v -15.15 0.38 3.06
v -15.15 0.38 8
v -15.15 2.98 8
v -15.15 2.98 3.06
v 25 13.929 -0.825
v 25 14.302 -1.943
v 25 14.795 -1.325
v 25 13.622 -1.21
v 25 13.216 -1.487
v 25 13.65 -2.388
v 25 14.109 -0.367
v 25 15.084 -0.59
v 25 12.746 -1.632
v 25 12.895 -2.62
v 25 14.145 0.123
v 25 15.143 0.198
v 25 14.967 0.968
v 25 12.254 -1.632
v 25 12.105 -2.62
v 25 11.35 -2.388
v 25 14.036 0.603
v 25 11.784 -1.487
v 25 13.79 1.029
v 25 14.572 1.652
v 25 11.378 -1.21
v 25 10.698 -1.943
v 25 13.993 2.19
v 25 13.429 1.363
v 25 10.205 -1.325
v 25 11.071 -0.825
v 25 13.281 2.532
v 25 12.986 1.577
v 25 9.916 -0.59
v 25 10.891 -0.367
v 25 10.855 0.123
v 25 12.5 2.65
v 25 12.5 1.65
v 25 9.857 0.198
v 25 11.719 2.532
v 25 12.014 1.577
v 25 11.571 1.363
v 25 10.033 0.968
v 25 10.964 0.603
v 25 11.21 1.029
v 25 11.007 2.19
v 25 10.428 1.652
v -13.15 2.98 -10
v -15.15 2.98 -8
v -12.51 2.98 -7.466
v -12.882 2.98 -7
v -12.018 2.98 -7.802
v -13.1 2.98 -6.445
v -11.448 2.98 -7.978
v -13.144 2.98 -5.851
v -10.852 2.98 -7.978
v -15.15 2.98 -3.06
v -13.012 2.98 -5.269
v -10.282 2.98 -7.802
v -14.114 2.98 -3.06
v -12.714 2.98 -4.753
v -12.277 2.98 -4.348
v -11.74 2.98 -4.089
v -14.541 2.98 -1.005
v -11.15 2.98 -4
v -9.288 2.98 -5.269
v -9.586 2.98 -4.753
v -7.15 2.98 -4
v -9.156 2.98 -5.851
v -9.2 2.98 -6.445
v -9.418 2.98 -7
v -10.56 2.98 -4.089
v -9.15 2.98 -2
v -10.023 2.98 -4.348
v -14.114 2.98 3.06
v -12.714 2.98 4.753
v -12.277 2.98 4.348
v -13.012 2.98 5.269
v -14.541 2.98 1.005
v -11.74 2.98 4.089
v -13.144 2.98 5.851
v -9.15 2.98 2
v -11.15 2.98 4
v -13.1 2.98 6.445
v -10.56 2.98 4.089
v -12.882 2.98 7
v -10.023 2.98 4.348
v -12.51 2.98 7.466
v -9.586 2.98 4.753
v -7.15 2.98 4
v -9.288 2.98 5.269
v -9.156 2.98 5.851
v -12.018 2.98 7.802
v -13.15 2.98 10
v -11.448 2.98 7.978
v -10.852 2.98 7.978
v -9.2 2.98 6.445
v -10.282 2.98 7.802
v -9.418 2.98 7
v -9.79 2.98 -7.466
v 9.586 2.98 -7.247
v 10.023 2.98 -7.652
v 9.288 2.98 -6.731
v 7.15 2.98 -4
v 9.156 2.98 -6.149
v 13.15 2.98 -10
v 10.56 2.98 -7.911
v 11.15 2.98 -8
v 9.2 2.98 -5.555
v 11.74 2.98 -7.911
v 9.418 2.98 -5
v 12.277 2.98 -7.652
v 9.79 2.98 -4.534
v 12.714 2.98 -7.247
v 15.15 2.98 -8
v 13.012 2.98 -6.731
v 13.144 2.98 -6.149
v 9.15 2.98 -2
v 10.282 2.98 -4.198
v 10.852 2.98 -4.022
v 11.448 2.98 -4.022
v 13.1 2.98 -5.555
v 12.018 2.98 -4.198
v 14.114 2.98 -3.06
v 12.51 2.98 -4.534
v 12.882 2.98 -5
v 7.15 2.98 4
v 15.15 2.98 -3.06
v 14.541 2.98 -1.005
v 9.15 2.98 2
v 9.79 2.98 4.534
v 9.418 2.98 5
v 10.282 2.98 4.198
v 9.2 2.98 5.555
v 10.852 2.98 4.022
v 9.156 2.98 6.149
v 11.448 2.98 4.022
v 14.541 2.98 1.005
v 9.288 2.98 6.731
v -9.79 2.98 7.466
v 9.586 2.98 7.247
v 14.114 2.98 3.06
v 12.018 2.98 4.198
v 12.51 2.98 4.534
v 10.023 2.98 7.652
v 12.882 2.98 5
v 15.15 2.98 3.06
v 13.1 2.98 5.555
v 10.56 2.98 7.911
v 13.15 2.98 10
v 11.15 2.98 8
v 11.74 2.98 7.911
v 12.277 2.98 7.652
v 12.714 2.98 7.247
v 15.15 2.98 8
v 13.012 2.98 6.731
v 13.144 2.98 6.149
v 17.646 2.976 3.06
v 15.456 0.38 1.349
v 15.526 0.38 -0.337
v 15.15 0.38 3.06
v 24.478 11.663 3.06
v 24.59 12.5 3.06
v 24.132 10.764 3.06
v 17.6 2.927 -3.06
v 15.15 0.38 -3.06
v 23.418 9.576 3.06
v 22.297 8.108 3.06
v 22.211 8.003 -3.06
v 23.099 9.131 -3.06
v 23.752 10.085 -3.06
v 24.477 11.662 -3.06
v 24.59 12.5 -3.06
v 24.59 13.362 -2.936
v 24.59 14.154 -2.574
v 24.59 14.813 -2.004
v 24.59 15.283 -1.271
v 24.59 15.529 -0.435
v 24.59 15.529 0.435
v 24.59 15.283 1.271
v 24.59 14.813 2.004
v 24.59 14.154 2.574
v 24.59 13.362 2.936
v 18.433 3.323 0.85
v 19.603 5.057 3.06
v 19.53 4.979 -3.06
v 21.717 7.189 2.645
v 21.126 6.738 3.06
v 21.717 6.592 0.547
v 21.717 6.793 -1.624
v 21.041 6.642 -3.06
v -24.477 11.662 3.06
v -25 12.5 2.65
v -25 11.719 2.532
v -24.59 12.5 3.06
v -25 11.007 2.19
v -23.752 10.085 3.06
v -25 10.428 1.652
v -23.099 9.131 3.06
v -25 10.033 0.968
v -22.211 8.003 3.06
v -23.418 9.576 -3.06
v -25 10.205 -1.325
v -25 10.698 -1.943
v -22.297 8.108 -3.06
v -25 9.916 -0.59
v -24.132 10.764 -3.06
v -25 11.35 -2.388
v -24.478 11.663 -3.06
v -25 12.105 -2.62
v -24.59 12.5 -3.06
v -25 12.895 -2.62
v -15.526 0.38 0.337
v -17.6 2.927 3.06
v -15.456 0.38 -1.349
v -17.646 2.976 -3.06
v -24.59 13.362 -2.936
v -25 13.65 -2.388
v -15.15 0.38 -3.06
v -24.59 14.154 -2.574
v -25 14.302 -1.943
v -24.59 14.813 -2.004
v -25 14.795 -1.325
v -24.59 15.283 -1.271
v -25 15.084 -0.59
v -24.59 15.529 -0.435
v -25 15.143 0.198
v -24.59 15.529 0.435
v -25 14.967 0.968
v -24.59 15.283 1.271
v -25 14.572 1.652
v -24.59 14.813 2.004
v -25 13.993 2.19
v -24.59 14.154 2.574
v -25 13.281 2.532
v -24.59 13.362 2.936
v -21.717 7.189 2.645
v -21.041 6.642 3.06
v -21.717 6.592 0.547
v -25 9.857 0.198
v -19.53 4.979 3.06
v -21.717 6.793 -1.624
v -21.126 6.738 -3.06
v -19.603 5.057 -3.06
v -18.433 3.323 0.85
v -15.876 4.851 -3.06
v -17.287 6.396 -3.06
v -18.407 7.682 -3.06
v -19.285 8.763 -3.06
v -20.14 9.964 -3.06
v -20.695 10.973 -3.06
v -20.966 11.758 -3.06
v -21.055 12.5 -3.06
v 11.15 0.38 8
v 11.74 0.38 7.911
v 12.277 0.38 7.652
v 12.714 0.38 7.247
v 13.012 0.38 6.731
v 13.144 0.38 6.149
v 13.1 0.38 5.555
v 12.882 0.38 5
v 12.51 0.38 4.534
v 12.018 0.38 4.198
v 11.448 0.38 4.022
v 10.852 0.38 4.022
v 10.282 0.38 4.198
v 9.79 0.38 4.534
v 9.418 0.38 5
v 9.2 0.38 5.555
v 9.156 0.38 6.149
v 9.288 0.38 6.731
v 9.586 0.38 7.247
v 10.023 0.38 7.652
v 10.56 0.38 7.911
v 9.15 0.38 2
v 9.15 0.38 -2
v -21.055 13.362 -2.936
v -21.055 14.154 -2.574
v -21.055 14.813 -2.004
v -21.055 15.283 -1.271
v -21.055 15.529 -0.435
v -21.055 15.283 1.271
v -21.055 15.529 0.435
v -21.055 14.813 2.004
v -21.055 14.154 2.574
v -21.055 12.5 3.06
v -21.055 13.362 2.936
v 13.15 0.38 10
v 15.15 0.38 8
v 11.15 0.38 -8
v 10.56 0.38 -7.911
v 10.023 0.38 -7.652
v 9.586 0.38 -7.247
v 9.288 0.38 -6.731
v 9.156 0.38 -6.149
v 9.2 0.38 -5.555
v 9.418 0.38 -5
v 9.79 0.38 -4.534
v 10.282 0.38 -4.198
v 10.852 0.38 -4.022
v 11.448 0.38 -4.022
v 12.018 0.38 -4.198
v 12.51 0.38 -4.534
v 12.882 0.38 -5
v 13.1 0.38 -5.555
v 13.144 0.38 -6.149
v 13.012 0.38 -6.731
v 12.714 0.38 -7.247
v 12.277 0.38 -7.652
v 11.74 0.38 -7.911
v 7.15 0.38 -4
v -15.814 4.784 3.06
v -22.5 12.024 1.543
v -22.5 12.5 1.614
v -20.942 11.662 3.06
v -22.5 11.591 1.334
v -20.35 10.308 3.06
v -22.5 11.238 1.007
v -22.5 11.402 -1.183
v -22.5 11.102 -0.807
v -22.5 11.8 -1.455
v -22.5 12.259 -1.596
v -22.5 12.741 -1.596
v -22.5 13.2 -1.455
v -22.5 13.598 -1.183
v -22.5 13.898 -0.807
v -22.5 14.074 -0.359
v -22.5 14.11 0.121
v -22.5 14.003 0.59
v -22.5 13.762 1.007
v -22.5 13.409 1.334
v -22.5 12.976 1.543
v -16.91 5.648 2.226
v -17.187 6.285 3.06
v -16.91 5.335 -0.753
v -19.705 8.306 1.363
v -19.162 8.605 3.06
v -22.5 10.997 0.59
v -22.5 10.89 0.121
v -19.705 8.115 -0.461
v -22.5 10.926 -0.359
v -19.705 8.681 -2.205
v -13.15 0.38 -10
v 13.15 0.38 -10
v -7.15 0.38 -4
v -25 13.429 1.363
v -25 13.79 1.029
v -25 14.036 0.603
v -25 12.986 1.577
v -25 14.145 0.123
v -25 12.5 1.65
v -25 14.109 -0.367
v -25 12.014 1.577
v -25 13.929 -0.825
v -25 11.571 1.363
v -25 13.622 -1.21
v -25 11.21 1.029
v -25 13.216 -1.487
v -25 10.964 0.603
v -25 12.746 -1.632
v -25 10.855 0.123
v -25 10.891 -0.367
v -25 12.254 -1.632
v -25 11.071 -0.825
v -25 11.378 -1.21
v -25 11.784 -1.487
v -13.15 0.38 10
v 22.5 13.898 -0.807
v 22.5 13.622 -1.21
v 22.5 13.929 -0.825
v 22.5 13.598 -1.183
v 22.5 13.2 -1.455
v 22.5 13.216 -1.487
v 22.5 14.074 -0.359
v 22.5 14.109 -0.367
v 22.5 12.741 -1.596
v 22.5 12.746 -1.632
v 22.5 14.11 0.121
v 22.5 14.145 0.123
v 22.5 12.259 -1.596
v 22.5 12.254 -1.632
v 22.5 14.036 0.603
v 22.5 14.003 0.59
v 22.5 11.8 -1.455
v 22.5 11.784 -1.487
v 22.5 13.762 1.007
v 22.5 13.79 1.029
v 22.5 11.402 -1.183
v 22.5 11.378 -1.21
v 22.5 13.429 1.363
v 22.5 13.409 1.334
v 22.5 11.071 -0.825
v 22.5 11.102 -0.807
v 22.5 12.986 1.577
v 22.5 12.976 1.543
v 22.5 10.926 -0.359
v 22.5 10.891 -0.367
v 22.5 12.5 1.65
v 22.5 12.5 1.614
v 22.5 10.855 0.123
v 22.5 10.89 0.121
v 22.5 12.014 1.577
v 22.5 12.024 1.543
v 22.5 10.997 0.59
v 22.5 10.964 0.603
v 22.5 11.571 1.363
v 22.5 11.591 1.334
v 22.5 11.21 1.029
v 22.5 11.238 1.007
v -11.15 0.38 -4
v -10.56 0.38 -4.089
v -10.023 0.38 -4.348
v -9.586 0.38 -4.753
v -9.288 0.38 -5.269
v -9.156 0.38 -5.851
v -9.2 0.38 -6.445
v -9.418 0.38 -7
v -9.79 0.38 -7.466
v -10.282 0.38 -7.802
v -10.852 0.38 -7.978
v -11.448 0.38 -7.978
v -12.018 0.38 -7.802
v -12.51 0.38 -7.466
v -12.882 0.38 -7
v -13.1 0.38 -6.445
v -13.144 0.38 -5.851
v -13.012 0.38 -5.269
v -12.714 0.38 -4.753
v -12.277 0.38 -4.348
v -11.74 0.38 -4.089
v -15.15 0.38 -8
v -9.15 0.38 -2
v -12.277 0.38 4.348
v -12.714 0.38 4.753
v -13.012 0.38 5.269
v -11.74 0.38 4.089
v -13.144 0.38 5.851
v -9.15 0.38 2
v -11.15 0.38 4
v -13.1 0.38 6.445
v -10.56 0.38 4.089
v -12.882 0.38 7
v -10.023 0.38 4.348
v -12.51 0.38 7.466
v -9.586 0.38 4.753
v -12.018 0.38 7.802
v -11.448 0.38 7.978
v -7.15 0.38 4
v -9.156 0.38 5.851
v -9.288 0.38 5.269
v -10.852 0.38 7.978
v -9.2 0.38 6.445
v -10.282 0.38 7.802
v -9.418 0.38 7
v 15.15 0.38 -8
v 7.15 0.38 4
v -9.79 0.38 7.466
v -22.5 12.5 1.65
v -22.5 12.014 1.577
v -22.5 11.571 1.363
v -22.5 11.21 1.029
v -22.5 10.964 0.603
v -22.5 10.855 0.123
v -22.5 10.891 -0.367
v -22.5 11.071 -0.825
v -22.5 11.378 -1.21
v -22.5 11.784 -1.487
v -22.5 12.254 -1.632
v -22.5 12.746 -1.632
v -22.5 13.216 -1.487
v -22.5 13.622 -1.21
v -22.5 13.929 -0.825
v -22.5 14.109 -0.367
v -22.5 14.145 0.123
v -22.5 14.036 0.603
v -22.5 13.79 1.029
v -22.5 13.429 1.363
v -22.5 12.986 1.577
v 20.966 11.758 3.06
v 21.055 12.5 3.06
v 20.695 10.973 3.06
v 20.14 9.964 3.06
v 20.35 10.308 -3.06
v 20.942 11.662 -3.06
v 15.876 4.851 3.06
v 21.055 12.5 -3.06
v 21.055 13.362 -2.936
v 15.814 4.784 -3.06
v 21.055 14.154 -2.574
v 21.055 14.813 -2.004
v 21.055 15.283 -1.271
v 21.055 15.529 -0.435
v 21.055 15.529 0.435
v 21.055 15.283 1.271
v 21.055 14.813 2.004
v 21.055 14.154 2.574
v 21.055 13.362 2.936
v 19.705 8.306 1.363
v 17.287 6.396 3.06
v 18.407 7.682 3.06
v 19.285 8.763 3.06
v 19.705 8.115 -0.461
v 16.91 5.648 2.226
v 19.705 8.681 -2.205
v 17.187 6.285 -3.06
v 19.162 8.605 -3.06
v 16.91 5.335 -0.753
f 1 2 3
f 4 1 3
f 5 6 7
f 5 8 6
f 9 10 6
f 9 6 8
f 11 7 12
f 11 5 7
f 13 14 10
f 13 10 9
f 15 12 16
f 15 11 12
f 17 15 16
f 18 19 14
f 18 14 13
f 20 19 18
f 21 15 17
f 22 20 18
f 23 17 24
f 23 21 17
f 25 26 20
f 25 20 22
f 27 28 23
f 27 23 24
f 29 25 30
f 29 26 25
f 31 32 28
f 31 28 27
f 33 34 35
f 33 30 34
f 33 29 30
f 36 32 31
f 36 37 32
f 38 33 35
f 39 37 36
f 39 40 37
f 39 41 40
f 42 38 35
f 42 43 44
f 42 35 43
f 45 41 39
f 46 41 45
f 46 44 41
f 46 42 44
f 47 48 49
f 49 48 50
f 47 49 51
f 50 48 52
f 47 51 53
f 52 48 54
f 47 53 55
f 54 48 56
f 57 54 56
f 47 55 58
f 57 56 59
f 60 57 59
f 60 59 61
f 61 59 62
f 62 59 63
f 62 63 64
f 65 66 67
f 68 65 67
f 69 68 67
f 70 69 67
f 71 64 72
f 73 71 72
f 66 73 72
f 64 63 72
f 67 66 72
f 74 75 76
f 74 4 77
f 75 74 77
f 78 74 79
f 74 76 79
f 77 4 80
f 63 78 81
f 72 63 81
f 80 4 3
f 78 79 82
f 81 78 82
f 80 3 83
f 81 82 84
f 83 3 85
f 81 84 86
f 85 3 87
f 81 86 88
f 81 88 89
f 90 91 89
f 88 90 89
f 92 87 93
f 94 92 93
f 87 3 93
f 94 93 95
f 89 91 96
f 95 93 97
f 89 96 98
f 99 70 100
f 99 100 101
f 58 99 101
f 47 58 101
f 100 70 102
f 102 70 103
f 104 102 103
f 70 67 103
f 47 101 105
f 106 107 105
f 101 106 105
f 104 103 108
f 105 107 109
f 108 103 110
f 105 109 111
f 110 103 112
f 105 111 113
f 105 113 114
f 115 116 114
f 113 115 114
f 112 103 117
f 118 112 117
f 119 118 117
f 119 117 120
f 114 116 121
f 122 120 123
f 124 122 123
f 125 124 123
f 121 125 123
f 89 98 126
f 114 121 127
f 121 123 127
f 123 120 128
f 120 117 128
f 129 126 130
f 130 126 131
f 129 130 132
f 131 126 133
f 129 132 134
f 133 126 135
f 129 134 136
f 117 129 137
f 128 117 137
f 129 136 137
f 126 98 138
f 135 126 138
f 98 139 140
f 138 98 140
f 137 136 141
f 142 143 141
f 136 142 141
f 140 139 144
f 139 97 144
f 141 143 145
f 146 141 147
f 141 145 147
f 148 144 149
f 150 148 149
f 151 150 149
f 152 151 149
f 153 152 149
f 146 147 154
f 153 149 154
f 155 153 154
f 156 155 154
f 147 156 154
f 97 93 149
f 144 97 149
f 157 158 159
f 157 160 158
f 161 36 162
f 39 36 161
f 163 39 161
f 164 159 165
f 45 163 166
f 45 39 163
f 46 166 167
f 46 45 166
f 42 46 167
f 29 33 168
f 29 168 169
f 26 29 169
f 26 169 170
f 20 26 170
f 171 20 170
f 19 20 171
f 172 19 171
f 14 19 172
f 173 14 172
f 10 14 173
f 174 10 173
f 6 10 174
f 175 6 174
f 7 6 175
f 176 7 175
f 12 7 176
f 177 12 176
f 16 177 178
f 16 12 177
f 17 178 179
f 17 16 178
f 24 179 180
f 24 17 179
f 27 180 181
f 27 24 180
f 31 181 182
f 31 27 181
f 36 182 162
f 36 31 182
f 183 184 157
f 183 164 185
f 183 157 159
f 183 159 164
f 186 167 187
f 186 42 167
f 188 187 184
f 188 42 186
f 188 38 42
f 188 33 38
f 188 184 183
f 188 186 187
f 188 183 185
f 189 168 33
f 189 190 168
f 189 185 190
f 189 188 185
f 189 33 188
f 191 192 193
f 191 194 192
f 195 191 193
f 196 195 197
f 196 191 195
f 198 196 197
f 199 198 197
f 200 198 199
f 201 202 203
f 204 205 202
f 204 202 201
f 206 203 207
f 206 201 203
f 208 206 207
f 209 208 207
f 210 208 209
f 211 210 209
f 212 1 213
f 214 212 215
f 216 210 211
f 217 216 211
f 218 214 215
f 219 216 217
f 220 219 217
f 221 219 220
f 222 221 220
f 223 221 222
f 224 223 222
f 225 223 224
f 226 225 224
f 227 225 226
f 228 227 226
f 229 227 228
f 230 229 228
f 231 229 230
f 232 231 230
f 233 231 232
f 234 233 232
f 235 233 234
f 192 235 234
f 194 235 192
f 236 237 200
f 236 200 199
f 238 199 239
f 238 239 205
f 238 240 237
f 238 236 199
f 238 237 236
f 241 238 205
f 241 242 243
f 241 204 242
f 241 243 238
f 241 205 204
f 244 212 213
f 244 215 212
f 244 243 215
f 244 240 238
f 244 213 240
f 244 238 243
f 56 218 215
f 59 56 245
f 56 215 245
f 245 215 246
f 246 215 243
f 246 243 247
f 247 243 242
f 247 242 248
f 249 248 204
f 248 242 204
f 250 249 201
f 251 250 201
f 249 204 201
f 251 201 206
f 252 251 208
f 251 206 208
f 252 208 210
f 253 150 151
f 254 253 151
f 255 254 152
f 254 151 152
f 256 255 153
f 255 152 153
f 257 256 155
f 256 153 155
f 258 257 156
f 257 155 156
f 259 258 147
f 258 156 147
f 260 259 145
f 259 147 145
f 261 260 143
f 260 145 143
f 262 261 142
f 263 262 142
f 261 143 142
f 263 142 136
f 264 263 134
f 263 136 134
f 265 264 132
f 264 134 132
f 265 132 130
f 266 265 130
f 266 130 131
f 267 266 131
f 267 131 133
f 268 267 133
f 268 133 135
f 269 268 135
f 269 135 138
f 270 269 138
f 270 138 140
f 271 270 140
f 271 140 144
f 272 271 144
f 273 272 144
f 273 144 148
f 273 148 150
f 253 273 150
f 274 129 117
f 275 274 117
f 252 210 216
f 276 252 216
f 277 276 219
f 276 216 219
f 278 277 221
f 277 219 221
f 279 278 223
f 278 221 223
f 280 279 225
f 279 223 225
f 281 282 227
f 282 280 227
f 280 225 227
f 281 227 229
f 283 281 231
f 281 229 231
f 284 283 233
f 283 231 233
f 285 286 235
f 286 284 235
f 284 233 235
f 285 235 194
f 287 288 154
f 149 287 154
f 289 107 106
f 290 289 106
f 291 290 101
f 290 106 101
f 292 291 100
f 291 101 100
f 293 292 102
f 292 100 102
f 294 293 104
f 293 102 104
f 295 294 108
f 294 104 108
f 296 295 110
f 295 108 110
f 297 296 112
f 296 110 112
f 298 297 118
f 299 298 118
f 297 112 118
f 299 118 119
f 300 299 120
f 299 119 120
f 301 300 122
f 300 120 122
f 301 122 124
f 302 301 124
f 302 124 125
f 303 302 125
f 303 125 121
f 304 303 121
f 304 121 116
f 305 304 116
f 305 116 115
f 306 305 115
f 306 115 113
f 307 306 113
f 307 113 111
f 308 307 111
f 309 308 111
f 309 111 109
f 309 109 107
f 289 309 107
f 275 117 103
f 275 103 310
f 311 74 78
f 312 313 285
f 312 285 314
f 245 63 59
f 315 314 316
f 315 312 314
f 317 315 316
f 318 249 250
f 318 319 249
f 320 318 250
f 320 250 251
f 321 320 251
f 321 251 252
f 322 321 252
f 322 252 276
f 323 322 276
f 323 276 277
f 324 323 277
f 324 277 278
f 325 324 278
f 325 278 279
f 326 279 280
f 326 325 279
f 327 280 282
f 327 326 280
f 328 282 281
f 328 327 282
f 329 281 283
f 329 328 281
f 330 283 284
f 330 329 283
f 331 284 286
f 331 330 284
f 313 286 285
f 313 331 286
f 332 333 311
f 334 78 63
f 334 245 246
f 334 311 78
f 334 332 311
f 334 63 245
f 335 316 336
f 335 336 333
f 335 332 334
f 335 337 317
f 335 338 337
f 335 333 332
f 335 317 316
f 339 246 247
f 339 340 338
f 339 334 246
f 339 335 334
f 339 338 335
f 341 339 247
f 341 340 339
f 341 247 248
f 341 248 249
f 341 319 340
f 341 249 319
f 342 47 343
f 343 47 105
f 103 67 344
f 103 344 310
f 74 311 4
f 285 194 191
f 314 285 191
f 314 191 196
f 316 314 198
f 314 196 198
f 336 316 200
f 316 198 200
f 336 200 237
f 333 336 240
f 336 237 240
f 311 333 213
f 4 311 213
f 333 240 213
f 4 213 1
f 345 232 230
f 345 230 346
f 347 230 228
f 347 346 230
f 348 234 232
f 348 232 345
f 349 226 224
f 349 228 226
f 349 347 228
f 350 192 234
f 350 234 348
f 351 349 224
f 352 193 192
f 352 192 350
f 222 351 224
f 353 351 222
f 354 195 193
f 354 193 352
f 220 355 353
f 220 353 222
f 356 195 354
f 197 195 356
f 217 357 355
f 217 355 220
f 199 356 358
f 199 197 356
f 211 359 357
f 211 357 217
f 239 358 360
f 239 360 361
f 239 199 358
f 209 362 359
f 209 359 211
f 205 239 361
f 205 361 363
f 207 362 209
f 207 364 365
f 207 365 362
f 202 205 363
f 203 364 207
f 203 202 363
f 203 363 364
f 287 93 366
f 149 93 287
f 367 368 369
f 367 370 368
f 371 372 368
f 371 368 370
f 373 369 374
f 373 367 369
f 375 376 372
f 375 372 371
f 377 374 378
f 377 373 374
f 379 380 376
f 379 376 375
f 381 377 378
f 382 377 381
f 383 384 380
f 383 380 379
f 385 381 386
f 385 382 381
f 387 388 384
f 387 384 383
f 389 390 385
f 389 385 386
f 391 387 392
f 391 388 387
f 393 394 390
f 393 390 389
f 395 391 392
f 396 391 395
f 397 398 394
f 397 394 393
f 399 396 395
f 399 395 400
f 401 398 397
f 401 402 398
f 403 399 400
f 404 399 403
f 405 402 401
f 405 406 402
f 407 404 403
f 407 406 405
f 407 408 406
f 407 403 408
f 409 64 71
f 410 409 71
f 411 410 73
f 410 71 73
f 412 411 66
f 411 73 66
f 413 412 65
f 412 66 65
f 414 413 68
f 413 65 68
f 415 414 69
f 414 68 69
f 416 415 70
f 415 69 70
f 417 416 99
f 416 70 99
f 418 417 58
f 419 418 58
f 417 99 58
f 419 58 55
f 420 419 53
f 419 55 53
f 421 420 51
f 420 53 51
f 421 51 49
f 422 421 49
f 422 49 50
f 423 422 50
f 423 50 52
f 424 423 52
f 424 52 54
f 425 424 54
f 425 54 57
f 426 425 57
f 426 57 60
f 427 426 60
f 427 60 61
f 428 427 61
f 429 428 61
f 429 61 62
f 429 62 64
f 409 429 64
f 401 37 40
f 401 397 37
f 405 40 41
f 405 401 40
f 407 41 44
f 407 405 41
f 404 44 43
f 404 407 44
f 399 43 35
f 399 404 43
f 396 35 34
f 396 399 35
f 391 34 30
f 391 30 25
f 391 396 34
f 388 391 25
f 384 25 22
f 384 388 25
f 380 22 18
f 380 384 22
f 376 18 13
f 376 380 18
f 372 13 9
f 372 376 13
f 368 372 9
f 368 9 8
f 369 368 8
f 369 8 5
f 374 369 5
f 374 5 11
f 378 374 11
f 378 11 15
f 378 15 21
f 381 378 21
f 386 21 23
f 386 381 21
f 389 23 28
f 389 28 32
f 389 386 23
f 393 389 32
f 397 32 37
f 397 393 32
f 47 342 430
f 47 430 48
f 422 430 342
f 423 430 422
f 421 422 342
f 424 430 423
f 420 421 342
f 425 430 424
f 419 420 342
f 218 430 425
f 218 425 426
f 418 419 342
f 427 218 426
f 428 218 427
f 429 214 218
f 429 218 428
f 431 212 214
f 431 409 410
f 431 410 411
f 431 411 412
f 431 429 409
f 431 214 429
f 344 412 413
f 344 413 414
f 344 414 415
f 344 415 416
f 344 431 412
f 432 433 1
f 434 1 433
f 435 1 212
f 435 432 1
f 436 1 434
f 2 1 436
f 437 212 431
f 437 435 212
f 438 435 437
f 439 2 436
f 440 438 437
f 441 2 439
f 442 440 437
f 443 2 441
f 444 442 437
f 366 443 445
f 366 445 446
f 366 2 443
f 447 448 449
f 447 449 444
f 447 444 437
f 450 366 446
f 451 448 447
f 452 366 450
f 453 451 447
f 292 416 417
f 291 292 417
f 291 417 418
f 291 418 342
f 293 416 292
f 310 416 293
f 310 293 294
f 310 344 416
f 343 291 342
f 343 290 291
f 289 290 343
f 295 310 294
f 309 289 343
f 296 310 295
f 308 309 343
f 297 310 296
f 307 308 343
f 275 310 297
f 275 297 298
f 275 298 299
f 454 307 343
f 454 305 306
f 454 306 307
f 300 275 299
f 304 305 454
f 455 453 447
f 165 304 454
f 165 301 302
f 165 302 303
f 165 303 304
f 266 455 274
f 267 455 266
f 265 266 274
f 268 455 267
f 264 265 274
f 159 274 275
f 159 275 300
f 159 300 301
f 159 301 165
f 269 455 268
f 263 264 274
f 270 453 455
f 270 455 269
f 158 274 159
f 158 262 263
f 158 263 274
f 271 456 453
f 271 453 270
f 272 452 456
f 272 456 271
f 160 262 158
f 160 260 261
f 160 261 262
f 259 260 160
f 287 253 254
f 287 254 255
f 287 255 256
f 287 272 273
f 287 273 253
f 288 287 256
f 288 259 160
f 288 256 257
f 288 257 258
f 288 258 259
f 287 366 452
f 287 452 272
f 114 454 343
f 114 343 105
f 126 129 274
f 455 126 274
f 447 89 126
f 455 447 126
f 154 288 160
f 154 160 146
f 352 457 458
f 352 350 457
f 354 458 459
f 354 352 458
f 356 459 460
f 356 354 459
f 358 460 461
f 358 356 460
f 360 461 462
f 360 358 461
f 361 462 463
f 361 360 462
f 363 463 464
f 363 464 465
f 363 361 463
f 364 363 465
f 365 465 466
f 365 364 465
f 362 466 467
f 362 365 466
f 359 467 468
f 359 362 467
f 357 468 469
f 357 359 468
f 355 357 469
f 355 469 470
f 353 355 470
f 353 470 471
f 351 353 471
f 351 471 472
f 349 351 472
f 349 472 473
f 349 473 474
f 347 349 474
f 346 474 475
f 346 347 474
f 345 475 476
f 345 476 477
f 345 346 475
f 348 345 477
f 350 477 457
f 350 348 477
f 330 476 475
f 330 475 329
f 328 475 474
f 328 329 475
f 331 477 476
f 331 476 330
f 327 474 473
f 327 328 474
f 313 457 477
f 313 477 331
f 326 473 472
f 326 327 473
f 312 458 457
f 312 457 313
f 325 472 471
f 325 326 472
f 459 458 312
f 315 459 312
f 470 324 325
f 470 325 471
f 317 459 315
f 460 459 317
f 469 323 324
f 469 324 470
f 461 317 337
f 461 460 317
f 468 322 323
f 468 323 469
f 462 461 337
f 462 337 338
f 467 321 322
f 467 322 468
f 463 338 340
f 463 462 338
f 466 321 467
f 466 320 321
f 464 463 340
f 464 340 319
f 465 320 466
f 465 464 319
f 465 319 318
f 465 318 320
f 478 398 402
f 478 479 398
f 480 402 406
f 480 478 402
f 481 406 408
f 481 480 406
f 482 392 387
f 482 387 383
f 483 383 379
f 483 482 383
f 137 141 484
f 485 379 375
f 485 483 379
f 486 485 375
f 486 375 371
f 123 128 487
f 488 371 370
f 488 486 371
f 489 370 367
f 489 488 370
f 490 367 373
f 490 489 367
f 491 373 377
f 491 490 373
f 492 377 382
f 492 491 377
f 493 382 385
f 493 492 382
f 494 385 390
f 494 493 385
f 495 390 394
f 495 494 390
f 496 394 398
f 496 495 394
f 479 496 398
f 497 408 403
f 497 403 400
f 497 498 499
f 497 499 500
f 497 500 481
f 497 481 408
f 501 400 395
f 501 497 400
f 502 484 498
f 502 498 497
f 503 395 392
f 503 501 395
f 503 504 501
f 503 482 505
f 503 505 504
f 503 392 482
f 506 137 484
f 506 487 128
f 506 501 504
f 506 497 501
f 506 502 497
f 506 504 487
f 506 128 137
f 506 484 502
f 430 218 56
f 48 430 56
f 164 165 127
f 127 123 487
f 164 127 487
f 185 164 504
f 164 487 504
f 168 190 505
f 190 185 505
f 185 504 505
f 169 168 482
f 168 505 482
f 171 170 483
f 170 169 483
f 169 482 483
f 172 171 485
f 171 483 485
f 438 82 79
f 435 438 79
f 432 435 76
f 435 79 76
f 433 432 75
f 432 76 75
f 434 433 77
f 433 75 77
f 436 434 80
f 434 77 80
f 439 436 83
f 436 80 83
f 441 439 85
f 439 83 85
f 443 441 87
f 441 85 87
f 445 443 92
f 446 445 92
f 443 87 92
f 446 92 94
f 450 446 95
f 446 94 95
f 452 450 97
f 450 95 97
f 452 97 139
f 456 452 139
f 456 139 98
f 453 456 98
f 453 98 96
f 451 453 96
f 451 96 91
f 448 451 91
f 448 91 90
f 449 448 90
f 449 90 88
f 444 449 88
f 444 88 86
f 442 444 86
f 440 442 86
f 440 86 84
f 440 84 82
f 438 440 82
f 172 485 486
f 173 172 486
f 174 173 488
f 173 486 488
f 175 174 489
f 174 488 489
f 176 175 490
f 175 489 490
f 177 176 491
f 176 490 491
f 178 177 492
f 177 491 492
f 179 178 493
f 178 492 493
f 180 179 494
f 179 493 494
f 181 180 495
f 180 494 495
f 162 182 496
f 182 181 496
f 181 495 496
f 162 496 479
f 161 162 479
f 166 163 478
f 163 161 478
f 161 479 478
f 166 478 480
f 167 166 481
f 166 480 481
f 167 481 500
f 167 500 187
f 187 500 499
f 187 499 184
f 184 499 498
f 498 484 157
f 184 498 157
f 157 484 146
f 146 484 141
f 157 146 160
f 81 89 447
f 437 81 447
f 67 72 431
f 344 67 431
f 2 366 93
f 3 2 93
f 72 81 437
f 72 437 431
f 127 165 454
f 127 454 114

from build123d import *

# Parameters (mm, degrees)
CUT_EXTRUDE1_DEPTH      = 38.5
CUT_EXTRUDE1_DEPTH_BACK = 38.5
SKETCH2_OUTSIDE_W       = 39.248
SKETCH2_OUTSIDE_H       = 39.248
SKETCH11_W              = 30.3
SKETCH11_H              = 2.599351838
BOSS_EXTRUDE2_DEPTH     = 10
CUT_EXTRUDE6_DEPTH      = 45.205596297
CUT_EXTRUDE6_DEPTH_BACK = 45.205596297
SKETCH13_W              = 18.3
SKETCH13_H              = 8
CUT_EXTRUDE7_DEPTH      = 30.719750749
SKETCH14_R              = 2
CUT_EXTRUDE8_DEPTH      = 30.719750749
CHAMFER1_SIZE           = 2


with BuildPart() as part:
    # Sketch1 → Revolve1 (revolve)
    with BuildSketch(Plane.XY, mode=Mode.PRIVATE) as revolve1_sk:
        Polygon((15.15, 0), (25, 9.85), (25, 10.85), (22.5, 10.85), (22.5, 10.885533906), (14.114466094, 2.5), (-14.114466094, 2.5), (-22.5, 10.885533906), (-22.5, 10.85), (-25, 10.85), (-25, 9.85), (-15.15, 0), align=None)
    revolve(revolve1_sk.sketch.rotate(Axis((-0.079113924, 12.5, 0), (1, 0, 0)), 270), axis=Axis((-0.079113924, 12.5, 0), (1, 0, 0)))

    # Sketch2 outside → Cut-Extrude1 (cut, two sides: drawn at the far end of the back side and taken through both)
    with BuildSketch(Plane(origin=(0, 0, 0), x_dir=(0, 0, -1), z_dir=(1, 0, 0)).offset(-CUT_EXTRUDE1_DEPTH_BACK)):
        with Locations((0, 12.5)):
            Rectangle(SKETCH2_OUTSIDE_W, SKETCH2_OUTSIDE_H)
        with BuildLine():
            Line((-3.059956427, 12.5), (-3.059956427, 0.380319036))
            ThreePointArc((-3.059956427, 0.380319036), (0, 0), (3.059956427, 0.380319036))
            Line((3.059956427, 0.380319036), (3.059956427, 12.5))
            ThreePointArc((3.059956427, 12.5), (0, 15.559956427), (-3.059956427, 12.5))
        make_face(mode=Mode.SUBTRACT)
    extrude(amount=CUT_EXTRUDE1_DEPTH + CUT_EXTRUDE1_DEPTH_BACK, mode=Mode.SUBTRACT)

    # Sketch11 → Boss-Extrude2 (add, symmetric)
    with BuildSketch(Plane.XY):
        with Locations((0, 1.679994955)):
            Rectangle(SKETCH11_W, SKETCH11_H)
    extrude(amount=BOSS_EXTRUDE2_DEPTH, both=True)

    # Sketch12 → Cut-Extrude6 (cut, two sides: drawn at the far end of the back side and taken through both)
    with BuildSketch(Plane.ZY.offset(15.15).offset(-CUT_EXTRUDE6_DEPTH_BACK)):
        with BuildLine():
            Line((-3.059956427, 0.380319036), (3.059956427, 0.380319036))
            ThreePointArc((3.059956427, 0.380319036), (0, 0), (-3.059956427, 0.380319036))
        make_face()
    extrude(amount=CUT_EXTRUDE6_DEPTH + CUT_EXTRUDE6_DEPTH_BACK, mode=Mode.SUBTRACT)

    # Sketch13 → Cut-Extrude7 (cut, through all)
    with BuildSketch(Plane(origin=(0, 2.979670874, 0), x_dir=(1, 0, 0), z_dir=(0, 1, 0))):
        Rectangle(SKETCH13_W, SKETCH13_H)
    extrude(amount=-CUT_EXTRUDE7_DEPTH, mode=Mode.SUBTRACT)

    # Sketch14 → Cut-Extrude8 (cut, through all)
    with BuildSketch(Plane(origin=(0, 2.979670874, 0), x_dir=(1, 0, 0), z_dir=(0, 1, 0))):
        with Locations(Location((11.15, -6, 0), (0, 0, 270))):
            Circle(SKETCH14_R)
        with Locations(Location((-11.15, -6, 0), (0, 0, 90))):
            Circle(SKETCH14_R)
        with Locations(Location((-11.15, 6, 0), (0, 0, 270))):
            Circle(SKETCH14_R)
        with Locations(Location((11.15, 6, 0), (0, 0, 90))):
            Circle(SKETCH14_R)
    extrude(amount=-CUT_EXTRUDE8_DEPTH, mode=Mode.SUBTRACT)

    # Chamfer1
    chamfer1_edges = [part.edges().sort_by_distance(p)[0] for p in [
        (-9.15, 1.679994955, -4),
        (9.15, 1.679994955, -4),
        (9.15, 1.679994955, 4),
        (-9.15, 1.679994955, 4),
        (15.15, 1.679994955, -10),
        (-15.15, 1.679994955, -10),
        (15.15, 1.679994955, 10),
        (-15.15, 1.679994955, 10),
    ]]
    chamfer(chamfer1_edges, length=CHAMFER1_SIZE)


solid = part.part
